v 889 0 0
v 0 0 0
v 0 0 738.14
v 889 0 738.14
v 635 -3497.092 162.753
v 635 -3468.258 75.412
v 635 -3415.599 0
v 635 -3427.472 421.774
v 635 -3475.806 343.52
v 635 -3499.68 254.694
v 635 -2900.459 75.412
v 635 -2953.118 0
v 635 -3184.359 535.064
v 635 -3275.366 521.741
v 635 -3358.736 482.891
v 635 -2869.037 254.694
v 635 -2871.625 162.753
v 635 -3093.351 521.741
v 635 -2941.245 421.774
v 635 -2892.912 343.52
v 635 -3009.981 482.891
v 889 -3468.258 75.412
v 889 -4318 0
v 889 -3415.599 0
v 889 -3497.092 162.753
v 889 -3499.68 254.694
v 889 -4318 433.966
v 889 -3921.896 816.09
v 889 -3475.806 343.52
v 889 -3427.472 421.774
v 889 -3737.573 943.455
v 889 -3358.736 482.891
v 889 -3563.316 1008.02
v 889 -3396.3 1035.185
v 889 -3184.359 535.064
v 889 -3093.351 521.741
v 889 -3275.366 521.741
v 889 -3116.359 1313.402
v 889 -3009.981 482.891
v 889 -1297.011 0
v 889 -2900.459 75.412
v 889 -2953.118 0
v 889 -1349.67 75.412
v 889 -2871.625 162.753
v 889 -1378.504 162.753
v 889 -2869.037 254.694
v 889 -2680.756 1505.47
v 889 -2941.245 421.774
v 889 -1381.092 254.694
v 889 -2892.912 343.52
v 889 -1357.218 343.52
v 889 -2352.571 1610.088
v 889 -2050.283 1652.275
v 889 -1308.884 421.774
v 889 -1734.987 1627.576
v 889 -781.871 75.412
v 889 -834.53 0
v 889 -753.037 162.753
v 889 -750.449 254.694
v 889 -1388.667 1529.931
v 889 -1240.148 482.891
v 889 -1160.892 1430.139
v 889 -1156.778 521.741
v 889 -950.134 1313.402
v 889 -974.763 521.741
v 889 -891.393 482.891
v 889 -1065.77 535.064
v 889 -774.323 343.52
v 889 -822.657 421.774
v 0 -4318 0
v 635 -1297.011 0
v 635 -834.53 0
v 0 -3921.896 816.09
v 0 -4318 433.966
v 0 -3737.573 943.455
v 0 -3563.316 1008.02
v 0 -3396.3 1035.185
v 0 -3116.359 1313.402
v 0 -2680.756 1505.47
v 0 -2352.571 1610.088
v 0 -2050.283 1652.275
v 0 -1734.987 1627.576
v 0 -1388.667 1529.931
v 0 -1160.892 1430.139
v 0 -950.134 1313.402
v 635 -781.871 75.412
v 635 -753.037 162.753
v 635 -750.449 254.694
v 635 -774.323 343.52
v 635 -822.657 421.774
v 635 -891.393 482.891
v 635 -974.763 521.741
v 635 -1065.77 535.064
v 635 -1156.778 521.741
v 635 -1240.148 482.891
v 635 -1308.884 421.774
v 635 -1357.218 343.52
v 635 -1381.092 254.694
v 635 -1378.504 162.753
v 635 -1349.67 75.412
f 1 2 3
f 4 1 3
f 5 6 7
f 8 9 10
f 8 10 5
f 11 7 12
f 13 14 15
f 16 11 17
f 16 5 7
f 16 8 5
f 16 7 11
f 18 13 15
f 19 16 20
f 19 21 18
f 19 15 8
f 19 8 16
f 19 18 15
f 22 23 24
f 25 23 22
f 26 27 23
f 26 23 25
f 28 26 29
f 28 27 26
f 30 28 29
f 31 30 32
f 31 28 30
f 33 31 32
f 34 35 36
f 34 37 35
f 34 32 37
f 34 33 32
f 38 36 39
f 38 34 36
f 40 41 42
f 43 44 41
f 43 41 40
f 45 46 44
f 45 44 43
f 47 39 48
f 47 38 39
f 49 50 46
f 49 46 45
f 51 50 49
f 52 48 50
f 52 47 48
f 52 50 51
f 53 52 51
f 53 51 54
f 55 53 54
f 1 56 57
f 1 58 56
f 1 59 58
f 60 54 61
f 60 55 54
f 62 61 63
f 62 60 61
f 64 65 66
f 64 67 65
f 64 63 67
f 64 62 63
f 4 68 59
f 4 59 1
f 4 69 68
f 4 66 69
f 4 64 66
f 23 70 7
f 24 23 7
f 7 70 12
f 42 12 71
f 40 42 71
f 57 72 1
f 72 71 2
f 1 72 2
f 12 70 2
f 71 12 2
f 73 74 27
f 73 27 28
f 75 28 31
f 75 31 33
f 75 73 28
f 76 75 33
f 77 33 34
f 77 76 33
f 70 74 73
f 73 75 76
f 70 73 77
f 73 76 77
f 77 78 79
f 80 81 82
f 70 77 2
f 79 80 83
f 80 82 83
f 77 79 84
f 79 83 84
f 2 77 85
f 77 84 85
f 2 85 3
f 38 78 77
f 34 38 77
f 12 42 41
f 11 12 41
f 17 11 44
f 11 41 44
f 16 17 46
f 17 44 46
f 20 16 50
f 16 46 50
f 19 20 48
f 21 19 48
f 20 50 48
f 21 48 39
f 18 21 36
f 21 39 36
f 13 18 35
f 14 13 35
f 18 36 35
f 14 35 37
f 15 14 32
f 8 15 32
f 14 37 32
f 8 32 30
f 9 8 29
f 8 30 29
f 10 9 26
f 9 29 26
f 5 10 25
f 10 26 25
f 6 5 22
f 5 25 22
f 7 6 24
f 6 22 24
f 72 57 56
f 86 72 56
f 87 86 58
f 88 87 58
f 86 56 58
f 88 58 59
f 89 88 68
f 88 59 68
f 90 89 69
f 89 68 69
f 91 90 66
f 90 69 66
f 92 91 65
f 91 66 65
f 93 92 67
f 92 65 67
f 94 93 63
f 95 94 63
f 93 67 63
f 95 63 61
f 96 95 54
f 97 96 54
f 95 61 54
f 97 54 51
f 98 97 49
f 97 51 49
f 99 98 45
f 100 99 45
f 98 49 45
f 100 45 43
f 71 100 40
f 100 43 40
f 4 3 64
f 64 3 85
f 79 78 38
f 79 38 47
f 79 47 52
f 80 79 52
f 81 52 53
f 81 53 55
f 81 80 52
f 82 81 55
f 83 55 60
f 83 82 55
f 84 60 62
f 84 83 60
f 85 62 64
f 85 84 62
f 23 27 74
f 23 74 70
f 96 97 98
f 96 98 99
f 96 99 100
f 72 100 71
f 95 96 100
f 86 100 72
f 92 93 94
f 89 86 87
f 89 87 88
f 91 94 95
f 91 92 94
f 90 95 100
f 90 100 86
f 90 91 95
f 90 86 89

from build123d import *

# Parameters (mm, degrees)
F1_DEPTH = 889
F3_DEPTH = 254


with BuildPart() as f1:
    # F0 (on Right) → F1 (new body)
    with BuildSketch(Plane.YZ):
        with BuildLine():
            Line((-4318, 0), (0, 0))
            Line((0, 0), (0, 738.1399869919))
            Line((0, 738.1399869919), (-950.1339793205, 1313.4015798569))
            add(Edge.make_bspline(
                [(-3116.3589595044, 1313.4015798569), (-2828.8090955066, 1445.195247453), (-2067.6608718539, 1826.8352239431), (-1270.3827619553, 1509.1091394424), (-950.1339793205, 1313.4015798569)],
                knots=[0, 0, 0, 0, 0.4920571993, 1, 1, 1, 1], degree=3))
            Line((-3116.3589595044, 1313.4015798569), (-3396.3003158569, 1035.1848602295))
            add(Edge.make_bspline(
                [(-4318, 433.9663982391), (-4118.4465186343, 639.9933583912), (-3782.9496026472, 986.3737335576), (-3507.7935980343, 1021.1097981374), (-3396.3003158569, 1035.1848602295)],
                knots=[0, 0, 0, 0, 0.5947997488, 1, 1, 1, 1], degree=3))
            Line((-4318, 433.9663982391), (-4318, 0))
        make_face()
    extrude(amount=F1_DEPTH)

    # F2 (on face) → F3 (cut)
    with BuildSketch(Plane.YZ.offset(889)):
        with BuildLine():
            ThreePointArc((-748.2704991237, 217.563778162), (-1182.7904415761, 512.71218671), (-1297.0111798697, 0))
            Line((-1297.0111798697, 0), (-834.5298183776, 0))
            ThreePointArc((-834.5298183777, 0), (-770.6220905756, 100.5438357096), (-748.2704991237, 217.563778162))
        make_face()
        with BuildLine():
            ThreePointArc((-2953.1179430142, 0), (-2889.2102152122, 100.5438357096), (-2866.8586237603, 217.563778162))
            ThreePointArc((-2866.8586237603, 217.563778162), (-3301.3785662127, 512.71218671), (-3415.5993045063, 0))
            Line((-3415.5993045062, 0), (-2953.1179430142, 0))
        make_face()
    extrude(amount=-F3_DEPTH, mode=Mode.SUBTRACT)


solid = f1.part
